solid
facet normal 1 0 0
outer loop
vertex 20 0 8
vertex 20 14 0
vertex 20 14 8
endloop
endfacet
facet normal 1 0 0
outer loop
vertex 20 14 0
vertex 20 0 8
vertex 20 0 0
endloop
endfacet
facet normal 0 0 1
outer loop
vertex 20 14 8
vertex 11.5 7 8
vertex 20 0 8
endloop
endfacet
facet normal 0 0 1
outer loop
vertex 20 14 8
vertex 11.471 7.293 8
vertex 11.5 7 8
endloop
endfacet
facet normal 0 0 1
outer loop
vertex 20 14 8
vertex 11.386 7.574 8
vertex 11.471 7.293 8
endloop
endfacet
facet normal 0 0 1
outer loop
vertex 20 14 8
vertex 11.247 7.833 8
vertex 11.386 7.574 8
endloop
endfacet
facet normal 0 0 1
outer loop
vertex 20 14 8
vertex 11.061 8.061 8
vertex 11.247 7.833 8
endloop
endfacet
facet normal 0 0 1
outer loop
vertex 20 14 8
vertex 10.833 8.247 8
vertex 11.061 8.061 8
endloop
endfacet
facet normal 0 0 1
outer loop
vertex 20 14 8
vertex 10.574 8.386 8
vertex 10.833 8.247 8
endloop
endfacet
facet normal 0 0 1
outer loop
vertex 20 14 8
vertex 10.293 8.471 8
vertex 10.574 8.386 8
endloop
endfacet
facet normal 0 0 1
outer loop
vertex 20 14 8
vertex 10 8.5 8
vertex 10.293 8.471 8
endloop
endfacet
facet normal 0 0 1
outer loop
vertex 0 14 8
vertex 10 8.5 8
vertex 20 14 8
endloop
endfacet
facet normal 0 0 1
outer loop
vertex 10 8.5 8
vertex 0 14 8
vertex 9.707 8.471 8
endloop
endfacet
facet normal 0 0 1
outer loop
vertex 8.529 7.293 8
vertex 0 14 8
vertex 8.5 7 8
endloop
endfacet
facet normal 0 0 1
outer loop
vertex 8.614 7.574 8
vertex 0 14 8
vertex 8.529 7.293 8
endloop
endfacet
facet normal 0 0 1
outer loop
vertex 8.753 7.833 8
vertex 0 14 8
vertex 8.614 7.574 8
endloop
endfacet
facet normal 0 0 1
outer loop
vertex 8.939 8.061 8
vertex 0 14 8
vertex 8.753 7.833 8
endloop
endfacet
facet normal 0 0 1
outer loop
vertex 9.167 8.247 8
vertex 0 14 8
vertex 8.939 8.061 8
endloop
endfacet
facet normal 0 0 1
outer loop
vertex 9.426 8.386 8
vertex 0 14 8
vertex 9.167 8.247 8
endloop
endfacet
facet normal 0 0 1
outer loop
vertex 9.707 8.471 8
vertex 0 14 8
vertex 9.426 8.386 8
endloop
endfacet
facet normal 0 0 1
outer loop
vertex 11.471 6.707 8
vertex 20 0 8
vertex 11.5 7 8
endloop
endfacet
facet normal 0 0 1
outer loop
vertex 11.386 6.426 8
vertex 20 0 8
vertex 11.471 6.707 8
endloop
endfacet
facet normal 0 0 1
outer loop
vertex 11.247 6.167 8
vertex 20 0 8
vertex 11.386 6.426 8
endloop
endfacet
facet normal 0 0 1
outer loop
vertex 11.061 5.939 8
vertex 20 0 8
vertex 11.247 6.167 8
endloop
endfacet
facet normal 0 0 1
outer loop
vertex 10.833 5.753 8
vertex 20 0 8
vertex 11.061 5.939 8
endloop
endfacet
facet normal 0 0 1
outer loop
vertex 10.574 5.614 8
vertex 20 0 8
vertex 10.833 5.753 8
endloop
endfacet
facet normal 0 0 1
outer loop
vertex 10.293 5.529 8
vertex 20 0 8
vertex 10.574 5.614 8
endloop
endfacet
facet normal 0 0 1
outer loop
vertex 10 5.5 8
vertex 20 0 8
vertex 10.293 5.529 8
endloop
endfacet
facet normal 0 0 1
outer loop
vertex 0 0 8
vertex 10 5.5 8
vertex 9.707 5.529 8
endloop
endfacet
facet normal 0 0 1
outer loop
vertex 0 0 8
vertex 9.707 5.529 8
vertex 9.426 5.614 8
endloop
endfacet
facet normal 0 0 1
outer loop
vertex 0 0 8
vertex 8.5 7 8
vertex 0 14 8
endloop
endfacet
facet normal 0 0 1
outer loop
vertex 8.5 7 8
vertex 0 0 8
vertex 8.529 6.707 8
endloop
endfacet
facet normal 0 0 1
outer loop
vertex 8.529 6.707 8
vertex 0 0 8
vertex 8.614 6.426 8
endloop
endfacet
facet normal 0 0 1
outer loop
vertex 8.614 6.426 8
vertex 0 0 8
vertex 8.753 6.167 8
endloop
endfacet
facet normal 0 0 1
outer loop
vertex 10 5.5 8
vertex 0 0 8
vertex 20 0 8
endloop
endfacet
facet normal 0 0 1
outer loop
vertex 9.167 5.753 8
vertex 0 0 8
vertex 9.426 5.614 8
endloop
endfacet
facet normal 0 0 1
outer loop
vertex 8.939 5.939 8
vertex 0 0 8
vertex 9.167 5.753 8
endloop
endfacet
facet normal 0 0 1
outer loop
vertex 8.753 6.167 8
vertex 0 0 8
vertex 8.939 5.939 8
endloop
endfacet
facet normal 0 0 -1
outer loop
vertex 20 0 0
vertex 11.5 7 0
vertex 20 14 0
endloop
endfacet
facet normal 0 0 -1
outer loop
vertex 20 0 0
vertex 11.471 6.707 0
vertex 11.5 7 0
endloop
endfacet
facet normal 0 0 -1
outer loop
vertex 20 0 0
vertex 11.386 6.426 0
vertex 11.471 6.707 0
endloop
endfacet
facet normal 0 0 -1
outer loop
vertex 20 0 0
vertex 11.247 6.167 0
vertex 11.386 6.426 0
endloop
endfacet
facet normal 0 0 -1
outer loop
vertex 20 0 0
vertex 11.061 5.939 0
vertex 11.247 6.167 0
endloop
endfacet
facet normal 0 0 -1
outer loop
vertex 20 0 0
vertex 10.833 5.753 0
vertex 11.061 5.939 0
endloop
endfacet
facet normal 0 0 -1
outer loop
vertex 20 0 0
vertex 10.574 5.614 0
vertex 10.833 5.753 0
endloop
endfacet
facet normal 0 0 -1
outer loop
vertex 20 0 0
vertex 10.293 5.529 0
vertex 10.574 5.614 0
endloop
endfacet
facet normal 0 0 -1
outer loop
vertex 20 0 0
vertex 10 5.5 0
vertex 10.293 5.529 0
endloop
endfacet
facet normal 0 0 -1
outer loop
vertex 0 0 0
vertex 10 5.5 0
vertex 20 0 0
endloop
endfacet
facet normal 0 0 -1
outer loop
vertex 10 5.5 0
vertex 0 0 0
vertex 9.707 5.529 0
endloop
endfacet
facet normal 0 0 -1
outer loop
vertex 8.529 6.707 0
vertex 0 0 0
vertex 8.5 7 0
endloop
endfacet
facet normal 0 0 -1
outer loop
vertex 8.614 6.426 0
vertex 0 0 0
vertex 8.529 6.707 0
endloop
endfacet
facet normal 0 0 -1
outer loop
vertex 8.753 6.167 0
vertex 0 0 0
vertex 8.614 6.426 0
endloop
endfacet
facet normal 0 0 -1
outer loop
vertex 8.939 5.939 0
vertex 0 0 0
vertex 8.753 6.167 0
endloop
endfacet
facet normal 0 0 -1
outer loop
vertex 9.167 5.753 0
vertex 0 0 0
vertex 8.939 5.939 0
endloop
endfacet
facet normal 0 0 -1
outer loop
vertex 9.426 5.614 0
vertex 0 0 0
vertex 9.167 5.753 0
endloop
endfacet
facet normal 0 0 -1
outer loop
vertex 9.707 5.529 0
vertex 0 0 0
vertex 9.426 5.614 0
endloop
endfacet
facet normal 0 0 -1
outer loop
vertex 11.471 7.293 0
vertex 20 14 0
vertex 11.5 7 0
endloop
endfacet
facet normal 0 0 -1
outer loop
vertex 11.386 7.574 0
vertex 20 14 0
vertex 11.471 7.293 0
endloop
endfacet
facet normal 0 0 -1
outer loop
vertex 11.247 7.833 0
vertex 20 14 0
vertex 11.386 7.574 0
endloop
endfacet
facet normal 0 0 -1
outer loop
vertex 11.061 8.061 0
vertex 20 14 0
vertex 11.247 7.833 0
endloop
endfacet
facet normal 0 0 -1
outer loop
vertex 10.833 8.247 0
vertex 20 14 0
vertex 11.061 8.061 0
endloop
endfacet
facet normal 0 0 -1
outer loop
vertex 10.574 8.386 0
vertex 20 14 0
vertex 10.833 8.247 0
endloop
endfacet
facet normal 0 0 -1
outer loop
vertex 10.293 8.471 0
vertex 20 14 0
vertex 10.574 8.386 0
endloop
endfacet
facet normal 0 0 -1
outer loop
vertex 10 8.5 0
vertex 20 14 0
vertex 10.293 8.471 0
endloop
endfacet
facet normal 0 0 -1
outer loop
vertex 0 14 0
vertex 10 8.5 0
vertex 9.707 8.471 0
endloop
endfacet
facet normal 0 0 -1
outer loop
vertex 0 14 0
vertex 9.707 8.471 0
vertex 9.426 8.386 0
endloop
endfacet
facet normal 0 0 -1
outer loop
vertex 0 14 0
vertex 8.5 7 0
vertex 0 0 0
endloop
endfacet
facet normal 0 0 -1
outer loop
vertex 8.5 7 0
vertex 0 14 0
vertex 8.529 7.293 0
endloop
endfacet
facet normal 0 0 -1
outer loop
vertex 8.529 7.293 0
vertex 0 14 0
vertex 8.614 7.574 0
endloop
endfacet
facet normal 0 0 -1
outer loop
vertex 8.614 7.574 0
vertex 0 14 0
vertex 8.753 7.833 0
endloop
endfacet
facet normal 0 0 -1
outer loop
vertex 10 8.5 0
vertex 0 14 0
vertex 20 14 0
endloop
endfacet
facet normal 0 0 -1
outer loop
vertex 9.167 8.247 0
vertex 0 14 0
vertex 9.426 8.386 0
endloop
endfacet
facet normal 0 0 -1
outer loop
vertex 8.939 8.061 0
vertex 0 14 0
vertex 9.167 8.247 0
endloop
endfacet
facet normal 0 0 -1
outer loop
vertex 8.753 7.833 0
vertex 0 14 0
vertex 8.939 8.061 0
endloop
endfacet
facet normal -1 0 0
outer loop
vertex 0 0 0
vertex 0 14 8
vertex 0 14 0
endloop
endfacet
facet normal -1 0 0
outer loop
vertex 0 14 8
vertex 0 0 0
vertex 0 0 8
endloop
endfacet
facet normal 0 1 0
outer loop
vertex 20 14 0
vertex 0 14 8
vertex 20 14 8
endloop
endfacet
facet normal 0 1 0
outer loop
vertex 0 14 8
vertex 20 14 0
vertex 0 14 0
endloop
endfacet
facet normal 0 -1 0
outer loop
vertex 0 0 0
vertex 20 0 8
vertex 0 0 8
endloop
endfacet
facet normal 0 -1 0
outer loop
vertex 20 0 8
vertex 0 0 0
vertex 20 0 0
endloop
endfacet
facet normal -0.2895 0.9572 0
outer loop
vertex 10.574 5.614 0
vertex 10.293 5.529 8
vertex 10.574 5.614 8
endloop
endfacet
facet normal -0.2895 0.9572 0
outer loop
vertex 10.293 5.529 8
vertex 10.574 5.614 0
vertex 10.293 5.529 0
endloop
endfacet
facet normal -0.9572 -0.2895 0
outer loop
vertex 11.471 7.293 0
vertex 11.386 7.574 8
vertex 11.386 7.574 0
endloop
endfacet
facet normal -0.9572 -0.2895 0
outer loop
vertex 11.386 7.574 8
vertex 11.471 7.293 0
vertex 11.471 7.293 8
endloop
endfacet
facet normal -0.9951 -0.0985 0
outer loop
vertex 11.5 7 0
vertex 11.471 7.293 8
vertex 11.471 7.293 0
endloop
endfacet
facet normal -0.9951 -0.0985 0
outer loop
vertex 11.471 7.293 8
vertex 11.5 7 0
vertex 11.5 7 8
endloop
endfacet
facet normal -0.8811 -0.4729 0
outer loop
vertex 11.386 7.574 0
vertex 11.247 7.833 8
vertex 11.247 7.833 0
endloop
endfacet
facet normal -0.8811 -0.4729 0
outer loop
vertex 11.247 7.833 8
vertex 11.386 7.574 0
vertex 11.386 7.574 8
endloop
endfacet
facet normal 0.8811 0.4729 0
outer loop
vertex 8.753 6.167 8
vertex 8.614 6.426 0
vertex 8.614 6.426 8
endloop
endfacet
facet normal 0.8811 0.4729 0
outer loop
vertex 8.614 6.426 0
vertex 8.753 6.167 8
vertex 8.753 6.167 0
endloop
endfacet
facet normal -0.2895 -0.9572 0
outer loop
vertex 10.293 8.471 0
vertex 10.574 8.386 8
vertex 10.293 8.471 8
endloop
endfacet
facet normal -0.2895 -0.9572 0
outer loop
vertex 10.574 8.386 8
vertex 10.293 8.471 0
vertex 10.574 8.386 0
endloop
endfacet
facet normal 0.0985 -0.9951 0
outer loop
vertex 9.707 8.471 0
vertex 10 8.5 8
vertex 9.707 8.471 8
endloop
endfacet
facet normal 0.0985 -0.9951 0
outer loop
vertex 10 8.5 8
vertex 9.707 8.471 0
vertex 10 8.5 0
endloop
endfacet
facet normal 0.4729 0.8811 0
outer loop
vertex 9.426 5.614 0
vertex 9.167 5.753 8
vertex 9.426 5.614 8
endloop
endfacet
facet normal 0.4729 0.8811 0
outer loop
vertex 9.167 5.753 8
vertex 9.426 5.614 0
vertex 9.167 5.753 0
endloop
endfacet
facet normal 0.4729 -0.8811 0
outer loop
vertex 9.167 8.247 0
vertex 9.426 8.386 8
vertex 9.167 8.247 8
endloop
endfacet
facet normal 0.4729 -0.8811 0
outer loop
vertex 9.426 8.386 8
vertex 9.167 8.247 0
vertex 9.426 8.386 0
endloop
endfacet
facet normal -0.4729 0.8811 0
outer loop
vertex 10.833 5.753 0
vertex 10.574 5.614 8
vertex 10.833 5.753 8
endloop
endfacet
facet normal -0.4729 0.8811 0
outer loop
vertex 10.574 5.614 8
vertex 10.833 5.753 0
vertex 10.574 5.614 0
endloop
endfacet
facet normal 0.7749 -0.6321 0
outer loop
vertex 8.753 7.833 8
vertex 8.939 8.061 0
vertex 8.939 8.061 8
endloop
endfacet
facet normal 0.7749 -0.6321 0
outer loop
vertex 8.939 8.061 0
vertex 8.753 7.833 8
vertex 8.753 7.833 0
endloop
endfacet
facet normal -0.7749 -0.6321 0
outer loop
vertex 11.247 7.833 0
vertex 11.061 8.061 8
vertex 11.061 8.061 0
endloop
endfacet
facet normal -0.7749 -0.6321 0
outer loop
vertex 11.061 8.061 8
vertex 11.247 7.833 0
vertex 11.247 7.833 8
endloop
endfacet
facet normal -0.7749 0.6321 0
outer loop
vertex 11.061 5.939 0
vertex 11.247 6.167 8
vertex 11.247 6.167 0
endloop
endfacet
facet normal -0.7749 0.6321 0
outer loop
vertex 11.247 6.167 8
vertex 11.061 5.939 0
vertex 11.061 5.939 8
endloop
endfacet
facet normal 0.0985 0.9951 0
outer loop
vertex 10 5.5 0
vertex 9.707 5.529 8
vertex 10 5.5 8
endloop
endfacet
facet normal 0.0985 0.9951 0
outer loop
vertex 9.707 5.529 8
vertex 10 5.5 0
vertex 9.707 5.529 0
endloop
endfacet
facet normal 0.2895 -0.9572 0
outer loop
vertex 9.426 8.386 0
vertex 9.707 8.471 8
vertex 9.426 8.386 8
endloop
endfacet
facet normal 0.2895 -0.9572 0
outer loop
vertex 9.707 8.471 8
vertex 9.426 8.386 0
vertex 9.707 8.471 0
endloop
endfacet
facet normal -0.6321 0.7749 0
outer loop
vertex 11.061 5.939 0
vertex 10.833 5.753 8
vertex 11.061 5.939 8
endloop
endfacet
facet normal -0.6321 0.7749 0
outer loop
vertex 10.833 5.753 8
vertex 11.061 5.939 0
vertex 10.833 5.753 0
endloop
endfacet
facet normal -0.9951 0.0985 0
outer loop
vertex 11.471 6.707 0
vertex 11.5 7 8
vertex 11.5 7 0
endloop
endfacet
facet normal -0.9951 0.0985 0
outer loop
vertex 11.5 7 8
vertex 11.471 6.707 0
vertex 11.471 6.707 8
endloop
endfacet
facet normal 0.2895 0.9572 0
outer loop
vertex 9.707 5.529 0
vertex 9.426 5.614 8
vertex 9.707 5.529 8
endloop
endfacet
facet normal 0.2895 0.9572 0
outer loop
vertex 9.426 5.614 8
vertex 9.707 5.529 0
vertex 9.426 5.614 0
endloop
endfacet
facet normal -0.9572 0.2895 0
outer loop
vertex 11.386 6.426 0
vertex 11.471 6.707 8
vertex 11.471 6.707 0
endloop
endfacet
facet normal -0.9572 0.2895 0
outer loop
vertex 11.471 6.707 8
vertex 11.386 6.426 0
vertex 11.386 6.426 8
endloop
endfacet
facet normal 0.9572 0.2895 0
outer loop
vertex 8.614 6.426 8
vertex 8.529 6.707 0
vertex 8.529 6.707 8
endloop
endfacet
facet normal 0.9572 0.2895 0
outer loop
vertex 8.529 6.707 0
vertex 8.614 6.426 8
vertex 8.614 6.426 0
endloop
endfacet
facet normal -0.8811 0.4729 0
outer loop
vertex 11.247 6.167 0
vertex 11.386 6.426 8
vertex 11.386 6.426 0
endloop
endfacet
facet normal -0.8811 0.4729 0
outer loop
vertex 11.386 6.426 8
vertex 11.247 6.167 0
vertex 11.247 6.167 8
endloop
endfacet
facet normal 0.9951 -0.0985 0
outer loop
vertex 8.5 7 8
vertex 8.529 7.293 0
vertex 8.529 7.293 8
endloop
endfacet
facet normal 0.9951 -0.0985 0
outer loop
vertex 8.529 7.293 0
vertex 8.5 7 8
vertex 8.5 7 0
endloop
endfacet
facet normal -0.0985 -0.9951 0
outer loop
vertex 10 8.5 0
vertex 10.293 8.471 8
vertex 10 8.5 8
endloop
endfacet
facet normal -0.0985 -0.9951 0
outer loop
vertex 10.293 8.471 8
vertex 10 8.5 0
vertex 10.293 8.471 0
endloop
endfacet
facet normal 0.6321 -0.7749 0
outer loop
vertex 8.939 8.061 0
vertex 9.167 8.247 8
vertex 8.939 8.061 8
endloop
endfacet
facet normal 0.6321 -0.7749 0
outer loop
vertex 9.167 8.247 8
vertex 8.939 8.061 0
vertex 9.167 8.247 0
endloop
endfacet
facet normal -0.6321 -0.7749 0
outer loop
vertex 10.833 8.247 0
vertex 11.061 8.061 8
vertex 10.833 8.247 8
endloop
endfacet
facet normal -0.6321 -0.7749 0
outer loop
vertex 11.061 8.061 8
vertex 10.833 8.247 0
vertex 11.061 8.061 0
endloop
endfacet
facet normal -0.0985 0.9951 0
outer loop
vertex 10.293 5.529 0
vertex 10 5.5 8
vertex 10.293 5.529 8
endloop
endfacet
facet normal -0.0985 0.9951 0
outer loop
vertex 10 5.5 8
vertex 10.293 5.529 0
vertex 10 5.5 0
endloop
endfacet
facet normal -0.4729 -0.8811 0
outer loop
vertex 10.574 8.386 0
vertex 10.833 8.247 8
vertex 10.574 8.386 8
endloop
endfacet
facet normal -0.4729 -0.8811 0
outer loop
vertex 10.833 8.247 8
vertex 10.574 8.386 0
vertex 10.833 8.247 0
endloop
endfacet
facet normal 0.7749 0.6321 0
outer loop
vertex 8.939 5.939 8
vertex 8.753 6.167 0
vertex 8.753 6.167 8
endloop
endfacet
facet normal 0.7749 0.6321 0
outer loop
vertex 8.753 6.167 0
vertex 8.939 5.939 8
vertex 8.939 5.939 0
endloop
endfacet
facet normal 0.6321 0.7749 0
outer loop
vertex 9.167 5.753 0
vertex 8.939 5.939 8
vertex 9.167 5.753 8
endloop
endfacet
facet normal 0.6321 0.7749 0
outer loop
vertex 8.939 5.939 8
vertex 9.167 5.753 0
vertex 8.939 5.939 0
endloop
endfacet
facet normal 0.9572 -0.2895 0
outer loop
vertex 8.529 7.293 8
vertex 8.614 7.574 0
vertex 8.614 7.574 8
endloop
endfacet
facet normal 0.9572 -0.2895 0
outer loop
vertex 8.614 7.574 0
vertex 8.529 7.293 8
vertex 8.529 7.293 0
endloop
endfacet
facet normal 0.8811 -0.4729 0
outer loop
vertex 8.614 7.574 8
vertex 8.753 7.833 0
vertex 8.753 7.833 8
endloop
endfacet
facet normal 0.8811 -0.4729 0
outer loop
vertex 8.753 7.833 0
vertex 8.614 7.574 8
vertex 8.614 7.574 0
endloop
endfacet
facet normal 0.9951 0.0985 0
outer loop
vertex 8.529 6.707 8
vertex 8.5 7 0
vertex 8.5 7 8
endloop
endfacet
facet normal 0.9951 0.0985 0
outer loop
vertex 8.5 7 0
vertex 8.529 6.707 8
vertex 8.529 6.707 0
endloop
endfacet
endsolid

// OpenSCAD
$fn = 32;

// ----------------------------------------------------------------------
// Micro pad: drilled pad, 5-20 mm class
// ----------------------------------------------------------------------

// --- parameters (mm) ---
pad_l = 20;               // pad length, X
pad_w = 14;               // pad width, Y
pad_t = 8;                // pad thickness, Z
hole_d = 3;               // through hole diameter

difference() {
  cube([pad_l, pad_w, pad_t]);
  translate([pad_l / 2, pad_w / 2, -1])
    cylinder(h = pad_t + 2, d = hole_d);
}
